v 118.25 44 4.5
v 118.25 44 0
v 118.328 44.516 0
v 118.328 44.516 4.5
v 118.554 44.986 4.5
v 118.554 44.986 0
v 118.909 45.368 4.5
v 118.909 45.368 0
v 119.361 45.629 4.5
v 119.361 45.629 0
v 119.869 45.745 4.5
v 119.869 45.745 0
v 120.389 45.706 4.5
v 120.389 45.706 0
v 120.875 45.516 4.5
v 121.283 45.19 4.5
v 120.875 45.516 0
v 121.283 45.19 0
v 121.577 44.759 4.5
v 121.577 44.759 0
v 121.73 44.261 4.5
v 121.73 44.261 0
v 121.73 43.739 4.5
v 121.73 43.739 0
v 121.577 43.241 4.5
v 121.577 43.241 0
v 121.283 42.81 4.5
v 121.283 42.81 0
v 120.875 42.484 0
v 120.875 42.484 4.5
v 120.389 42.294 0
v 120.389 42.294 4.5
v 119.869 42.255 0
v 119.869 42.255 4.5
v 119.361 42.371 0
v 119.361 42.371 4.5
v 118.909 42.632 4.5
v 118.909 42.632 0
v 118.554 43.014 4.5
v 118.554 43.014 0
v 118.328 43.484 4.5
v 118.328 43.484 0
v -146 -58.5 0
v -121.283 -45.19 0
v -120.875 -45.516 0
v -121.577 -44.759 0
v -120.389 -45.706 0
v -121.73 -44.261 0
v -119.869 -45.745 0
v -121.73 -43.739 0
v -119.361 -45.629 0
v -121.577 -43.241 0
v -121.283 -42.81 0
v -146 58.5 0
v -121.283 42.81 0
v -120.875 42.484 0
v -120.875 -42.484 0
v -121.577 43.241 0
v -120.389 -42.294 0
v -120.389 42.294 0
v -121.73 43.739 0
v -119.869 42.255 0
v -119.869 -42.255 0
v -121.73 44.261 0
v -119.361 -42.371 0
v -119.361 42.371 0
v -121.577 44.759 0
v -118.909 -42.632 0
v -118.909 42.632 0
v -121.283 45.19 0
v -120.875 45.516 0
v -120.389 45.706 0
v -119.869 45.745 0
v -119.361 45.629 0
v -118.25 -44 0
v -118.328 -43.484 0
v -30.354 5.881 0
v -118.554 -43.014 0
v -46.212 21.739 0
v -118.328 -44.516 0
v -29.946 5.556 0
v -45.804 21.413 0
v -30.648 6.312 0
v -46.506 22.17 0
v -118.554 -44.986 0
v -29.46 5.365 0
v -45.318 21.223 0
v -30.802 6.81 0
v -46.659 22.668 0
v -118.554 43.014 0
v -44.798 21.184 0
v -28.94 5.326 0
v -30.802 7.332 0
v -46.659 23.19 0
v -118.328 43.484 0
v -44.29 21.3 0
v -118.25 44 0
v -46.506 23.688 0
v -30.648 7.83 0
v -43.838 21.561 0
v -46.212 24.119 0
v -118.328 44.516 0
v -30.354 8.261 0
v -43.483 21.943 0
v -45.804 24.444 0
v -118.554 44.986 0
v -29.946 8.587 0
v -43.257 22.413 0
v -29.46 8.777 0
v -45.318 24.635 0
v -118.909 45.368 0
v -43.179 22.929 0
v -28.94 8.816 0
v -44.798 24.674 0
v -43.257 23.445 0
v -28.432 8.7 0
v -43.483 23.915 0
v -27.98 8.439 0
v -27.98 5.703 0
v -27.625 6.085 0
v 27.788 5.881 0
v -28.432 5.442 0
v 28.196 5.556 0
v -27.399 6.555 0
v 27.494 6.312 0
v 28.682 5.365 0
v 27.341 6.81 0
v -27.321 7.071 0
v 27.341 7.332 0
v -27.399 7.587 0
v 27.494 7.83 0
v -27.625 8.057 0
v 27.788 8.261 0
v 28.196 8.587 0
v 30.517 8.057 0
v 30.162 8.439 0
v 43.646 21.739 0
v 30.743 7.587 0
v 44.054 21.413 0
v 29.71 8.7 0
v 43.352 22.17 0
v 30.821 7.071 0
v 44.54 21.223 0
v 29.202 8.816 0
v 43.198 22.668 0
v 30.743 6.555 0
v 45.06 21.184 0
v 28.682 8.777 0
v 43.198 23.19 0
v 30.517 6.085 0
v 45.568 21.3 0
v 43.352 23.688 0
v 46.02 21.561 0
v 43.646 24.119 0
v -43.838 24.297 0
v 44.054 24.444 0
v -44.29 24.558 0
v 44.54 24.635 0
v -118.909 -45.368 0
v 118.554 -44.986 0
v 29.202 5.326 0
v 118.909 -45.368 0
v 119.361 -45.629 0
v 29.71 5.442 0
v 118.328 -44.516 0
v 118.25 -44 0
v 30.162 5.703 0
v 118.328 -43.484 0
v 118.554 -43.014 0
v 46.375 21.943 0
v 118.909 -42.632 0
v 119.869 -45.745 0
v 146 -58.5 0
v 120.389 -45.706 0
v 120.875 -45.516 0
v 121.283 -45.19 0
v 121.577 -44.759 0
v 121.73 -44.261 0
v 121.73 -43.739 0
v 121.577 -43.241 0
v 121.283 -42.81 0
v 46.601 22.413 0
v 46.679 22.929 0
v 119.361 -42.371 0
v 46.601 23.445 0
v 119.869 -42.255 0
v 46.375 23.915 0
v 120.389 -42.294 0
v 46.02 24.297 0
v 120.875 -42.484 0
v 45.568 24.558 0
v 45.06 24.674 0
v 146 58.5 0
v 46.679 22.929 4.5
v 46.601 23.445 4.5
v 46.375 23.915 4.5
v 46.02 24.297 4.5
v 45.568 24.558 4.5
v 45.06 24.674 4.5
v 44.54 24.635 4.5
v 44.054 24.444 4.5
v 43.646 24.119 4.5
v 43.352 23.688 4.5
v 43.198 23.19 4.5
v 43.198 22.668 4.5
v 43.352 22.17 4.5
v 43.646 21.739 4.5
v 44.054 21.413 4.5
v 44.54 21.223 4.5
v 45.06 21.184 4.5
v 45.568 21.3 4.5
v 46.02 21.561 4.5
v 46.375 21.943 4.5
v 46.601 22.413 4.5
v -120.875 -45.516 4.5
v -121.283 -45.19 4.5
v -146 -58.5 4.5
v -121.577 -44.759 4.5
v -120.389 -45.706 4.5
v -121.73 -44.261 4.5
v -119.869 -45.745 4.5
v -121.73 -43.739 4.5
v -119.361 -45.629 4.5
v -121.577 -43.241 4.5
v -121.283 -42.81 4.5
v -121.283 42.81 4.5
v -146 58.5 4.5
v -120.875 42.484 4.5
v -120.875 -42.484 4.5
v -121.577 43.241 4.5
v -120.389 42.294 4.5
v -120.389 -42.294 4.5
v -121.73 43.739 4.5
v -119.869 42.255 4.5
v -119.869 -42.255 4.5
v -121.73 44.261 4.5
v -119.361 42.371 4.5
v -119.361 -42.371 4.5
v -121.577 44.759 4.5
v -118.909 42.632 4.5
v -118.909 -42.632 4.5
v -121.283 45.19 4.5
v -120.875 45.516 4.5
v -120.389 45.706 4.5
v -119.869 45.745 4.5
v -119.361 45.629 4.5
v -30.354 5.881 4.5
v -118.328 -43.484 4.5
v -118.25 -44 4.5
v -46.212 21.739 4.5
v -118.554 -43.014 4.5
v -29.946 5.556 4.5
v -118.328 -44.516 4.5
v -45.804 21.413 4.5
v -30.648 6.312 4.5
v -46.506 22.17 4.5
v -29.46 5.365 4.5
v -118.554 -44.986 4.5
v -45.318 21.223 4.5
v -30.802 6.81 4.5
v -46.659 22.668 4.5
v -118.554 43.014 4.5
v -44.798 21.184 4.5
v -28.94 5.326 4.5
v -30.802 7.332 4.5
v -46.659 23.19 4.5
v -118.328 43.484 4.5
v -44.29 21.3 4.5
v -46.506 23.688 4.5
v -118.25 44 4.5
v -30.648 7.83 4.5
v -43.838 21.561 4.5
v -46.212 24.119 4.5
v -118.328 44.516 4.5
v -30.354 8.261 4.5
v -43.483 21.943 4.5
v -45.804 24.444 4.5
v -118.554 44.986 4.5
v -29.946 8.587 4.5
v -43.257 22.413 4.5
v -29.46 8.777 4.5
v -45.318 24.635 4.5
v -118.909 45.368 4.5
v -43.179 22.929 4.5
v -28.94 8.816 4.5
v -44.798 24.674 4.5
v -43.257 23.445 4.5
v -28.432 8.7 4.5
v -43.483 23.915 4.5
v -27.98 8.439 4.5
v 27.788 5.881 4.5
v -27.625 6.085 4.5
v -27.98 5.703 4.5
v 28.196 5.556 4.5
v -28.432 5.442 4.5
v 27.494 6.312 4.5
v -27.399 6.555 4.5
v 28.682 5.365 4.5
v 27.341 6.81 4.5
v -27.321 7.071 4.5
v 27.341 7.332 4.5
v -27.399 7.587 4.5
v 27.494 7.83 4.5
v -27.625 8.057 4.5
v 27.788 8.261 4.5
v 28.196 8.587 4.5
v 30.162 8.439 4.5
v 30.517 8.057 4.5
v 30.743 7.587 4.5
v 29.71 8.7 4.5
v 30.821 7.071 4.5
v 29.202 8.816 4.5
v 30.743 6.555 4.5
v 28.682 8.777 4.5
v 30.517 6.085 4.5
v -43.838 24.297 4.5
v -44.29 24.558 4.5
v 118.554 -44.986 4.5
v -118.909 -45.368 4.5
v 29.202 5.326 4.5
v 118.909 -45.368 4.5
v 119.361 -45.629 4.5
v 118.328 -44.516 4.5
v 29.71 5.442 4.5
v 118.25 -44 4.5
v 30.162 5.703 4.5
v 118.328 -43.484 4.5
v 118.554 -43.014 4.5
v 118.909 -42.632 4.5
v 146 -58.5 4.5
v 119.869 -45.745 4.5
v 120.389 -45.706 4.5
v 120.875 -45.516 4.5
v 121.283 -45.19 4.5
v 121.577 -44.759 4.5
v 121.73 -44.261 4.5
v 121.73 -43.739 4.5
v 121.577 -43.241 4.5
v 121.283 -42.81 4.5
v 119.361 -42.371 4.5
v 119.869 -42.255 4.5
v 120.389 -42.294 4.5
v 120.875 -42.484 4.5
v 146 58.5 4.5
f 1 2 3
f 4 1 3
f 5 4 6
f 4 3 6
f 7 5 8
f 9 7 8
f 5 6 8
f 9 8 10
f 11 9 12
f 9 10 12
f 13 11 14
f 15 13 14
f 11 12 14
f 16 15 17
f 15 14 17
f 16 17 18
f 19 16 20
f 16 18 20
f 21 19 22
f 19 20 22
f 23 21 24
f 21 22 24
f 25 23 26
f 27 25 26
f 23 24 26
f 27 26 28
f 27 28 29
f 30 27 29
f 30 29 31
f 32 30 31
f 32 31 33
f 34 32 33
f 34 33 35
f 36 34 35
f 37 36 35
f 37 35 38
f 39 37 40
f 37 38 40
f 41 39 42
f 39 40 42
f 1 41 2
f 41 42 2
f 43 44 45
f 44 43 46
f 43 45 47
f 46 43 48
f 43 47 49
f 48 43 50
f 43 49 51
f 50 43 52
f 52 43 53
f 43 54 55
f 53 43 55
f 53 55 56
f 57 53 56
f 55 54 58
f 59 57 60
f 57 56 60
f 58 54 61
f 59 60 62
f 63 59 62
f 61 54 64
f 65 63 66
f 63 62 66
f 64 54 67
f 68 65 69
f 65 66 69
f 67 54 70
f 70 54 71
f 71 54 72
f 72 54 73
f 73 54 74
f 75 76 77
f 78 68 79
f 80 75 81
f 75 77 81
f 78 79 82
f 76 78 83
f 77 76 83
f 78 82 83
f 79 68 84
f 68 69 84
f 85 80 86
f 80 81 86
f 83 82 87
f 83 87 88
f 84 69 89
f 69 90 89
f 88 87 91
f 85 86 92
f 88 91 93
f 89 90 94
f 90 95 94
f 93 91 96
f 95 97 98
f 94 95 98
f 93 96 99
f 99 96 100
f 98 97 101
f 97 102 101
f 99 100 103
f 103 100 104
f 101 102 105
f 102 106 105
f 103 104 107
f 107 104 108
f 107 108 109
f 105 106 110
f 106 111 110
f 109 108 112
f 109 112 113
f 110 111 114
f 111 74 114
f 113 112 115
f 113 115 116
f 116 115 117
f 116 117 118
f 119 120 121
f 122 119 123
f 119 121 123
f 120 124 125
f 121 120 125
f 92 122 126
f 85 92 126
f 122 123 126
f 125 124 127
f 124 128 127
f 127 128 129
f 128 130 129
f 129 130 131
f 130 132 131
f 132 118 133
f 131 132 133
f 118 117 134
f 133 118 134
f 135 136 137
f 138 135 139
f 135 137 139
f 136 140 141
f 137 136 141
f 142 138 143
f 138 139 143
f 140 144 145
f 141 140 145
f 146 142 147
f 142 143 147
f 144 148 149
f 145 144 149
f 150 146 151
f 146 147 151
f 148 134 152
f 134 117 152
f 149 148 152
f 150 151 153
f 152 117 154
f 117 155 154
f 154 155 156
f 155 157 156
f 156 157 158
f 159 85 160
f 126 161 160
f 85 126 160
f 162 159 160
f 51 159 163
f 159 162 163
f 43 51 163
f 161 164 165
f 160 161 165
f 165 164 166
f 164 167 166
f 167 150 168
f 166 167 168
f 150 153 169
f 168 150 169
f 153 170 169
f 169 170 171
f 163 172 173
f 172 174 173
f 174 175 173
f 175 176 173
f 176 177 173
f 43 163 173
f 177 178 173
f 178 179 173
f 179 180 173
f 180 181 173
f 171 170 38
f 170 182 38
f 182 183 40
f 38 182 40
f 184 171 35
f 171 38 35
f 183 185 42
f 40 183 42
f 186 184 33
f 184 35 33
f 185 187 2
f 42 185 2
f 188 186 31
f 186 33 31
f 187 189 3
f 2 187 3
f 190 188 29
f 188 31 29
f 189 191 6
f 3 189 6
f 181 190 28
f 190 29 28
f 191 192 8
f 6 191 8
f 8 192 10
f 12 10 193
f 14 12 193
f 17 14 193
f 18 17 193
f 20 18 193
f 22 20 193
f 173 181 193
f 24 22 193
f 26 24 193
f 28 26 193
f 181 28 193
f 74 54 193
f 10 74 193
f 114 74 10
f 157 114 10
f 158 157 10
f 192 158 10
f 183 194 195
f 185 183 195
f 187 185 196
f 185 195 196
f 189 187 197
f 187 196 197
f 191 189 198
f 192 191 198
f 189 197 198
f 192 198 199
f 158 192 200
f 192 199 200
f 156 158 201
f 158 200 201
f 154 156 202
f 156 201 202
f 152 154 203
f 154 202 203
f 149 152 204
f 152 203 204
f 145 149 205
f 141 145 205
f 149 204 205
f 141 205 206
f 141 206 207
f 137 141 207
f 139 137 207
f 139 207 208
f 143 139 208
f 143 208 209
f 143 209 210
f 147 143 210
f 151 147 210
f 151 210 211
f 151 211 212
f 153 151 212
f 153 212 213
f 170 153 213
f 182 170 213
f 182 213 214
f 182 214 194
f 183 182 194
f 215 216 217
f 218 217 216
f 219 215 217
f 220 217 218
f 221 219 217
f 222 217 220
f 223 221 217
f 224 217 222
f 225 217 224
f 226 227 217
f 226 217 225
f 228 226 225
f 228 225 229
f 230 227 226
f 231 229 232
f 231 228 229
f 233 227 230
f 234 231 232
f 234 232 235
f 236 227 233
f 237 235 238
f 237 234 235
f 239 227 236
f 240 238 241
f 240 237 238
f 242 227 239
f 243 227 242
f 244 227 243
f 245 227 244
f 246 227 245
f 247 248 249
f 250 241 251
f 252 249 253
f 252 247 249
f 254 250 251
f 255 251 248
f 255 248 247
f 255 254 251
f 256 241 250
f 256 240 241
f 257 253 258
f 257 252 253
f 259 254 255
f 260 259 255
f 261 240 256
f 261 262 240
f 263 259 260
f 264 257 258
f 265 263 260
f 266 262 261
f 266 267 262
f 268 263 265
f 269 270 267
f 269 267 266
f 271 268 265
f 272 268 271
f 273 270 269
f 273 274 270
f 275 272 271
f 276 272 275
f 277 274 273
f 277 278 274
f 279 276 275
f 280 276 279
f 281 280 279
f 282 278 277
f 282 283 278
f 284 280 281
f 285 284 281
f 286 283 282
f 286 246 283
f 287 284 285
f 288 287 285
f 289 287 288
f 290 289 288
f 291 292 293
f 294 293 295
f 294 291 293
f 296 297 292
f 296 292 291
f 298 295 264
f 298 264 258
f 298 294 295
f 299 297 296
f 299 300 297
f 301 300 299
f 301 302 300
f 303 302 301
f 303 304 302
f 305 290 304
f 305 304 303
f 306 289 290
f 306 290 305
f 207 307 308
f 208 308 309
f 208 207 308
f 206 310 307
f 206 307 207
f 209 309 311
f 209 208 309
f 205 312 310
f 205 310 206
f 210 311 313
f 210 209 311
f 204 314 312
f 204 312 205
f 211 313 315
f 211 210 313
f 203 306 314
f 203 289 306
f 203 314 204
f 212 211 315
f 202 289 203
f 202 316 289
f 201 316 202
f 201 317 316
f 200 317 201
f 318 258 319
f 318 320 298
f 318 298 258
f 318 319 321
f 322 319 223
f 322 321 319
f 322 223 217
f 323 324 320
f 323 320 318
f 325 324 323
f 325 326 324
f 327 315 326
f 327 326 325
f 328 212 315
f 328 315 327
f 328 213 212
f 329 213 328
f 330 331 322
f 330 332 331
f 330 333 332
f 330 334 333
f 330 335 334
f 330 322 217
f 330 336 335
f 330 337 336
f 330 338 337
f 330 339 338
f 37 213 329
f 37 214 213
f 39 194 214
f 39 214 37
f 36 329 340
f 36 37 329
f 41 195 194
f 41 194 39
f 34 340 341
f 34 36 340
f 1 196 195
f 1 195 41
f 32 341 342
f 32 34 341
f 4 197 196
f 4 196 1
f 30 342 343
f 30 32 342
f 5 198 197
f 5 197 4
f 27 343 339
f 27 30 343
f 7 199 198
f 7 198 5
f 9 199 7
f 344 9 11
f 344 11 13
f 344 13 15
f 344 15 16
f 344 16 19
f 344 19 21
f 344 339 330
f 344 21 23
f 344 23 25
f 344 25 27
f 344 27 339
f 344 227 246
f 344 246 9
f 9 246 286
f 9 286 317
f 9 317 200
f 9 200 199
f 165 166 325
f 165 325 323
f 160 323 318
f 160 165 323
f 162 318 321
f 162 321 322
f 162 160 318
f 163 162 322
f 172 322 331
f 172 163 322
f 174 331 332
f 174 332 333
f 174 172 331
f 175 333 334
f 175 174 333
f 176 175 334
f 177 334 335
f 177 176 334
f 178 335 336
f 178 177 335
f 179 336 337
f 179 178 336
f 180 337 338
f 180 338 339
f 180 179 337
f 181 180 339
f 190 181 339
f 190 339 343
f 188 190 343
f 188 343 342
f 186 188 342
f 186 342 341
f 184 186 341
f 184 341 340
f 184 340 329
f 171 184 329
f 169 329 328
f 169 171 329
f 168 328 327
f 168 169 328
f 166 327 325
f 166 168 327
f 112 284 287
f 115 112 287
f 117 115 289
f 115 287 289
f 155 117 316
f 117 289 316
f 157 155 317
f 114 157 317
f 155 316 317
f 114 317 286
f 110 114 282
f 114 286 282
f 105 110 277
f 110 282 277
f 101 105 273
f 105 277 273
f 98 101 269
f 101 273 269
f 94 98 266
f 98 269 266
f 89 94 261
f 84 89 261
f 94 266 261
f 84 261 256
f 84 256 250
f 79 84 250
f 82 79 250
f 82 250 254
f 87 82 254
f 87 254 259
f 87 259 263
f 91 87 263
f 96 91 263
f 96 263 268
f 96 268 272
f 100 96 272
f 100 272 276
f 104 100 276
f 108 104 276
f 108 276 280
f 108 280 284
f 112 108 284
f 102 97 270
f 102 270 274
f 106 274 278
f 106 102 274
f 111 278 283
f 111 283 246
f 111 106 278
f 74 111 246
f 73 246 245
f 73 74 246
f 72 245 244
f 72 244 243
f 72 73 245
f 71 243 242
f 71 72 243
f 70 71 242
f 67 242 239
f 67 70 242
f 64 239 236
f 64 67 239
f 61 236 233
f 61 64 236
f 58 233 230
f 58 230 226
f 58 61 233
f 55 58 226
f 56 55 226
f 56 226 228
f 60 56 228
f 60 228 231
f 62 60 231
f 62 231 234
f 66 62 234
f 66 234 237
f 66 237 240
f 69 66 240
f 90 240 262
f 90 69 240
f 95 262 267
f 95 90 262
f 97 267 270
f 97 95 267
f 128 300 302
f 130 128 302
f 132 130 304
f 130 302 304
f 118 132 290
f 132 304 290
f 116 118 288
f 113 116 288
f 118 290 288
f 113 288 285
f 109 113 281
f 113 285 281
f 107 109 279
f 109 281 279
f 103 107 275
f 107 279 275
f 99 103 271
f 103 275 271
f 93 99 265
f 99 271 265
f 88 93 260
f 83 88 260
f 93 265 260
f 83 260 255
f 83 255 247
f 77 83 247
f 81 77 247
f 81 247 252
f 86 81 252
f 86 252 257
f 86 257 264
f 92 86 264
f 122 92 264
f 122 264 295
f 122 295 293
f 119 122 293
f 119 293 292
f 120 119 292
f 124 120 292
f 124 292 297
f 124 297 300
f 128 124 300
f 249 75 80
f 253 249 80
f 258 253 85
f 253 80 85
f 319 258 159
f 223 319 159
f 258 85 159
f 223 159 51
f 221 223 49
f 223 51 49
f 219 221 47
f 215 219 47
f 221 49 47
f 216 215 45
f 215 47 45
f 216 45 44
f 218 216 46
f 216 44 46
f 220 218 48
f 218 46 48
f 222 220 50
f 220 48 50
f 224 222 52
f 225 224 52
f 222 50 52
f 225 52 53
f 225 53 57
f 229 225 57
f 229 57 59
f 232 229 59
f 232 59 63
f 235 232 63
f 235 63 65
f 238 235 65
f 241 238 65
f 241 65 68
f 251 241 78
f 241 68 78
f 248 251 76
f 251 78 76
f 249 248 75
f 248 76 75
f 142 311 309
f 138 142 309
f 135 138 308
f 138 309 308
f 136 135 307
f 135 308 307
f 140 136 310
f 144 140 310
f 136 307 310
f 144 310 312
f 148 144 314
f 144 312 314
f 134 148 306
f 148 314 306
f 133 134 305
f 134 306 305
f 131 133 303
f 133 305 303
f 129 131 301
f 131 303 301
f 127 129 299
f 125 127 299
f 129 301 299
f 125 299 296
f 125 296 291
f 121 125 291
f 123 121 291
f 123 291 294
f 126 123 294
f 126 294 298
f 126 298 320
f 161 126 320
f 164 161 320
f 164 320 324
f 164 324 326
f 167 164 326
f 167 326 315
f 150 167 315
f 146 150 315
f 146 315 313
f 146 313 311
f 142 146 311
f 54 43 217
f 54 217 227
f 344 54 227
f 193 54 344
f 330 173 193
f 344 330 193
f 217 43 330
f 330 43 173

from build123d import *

# Parameters (mm, degrees)
SKETCH1_W               = 292
SKETCH1_H               = 117
BOSS_EXTRUDE1_DEPTH     = 4.5
CUT_EXTRUDE1_REACH      = 159.348
SKETCH1_3_R             = 1.75
MIRROR3_COPY_1_REACH    = 159.348
MIRROR3_COPY_1_SKETCH_R = 1.75
MIRROR3_COPY_2_REACH    = 159.348
MIRROR3_COPY_2_SKETCH_R = 1.75
CUT_EXTRUDE2_REACH      = 159.348
SKETCH2_R               = 1.75


with BuildPart() as part:
    # Sketch1 → Boss-Extrude1 (new body)
    with BuildSketch(Plane.XY):
        Rectangle(SKETCH1_W, SKETCH1_H)
    extrude(amount=BOSS_EXTRUDE1_DEPTH)

    # Sketch1<3> → Cut-Extrude1 (cut, up to next)
    with BuildSketch(Plane.XY, mode=Mode.PRIVATE) as cut_extrude1_sk1:
        with Locations((-120, 44)):
            Circle(SKETCH1_3_R)
    cut_extrude1_tool1 = extrude(cut_extrude1_sk1.sketch, amount=CUT_EXTRUDE1_REACH, mode=Mode.PRIVATE) & part.part
    cut_extrude1 = cut_extrude1_tool1.solids().sort_by_distance((-120, 44, 0))[0]
    add(cut_extrude1, mode=Mode.SUBTRACT)

    # Mirror2: Cut-Extrude1 across plane
    add(cut_extrude1.mirror(Plane.ZX), mode=Mode.SUBTRACT)

    # Mirror3 copy 1 sketch → Mirror3 copy 1 (cut, up to next)
    with BuildSketch(Plane(origin=(0, 0, 0), x_dir=(-1, 0, 0), z_dir=(0, 0, 1)), mode=Mode.PRIVATE) as mirror3_copy_1_sk1:
        with Locations((-120, 44)):
            Circle(MIRROR3_COPY_1_SKETCH_R)
    mirror3_copy_1_tool1 = extrude(mirror3_copy_1_sk1.sketch, amount=MIRROR3_COPY_1_REACH, mode=Mode.PRIVATE) & part.part
    add(mirror3_copy_1_tool1.solids().sort_by_distance((120, -44, 0))[0], mode=Mode.SUBTRACT)

    # Mirror3 copy 2 sketch → Mirror3 copy 2 (cut, up to next)
    with BuildSketch(Plane(origin=(0, 0, 0), x_dir=(-1, 0, 0), z_dir=(0, 0, 1)), mode=Mode.PRIVATE) as mirror3_copy_2_sk1:
        with Locations((-120, -44)):
            Circle(MIRROR3_COPY_2_SKETCH_R)
    mirror3_copy_2_tool1 = extrude(mirror3_copy_2_sk1.sketch, amount=MIRROR3_COPY_2_REACH, mode=Mode.PRIVATE) & part.part
    add(mirror3_copy_2_tool1.solids().sort_by_distance((120, 44, 0))[0], mode=Mode.SUBTRACT)

    # Sketch2 → Cut-Extrude2 (cut, up to next)
    with BuildSketch(Plane.XY.offset(4.5), mode=Mode.PRIVATE) as cut_extrude2_sk1:
        with Locations((-29.071067812, 7.071067812)):
            Circle(SKETCH2_R)
    cut_extrude2_tool1 = extrude(cut_extrude2_sk1.sketch, amount=-CUT_EXTRUDE2_REACH, mode=Mode.PRIVATE) & part.part
    # Sketch2 → Cut-Extrude2 (cut, up to next)
    with BuildSketch(Plane.XY.offset(4.5), mode=Mode.PRIVATE) as cut_extrude2_sk2:
        with Locations((-44.928932188, 22.928932188)):
            Circle(SKETCH2_R)
    cut_extrude2_tool2 = extrude(cut_extrude2_sk2.sketch, amount=-CUT_EXTRUDE2_REACH, mode=Mode.PRIVATE) & part.part
    # Sketch2 → Cut-Extrude2 (cut, up to next)
    with BuildSketch(Plane.XY.offset(4.5), mode=Mode.PRIVATE) as cut_extrude2_sk3:
        with Locations((44.928932188, 22.928932188)):
            Circle(SKETCH2_R)
    cut_extrude2_tool3 = extrude(cut_extrude2_sk3.sketch, amount=-CUT_EXTRUDE2_REACH, mode=Mode.PRIVATE) & part.part
    # Sketch2 → Cut-Extrude2 (cut, up to next)
    with BuildSketch(Plane.XY.offset(4.5), mode=Mode.PRIVATE) as cut_extrude2_sk4:
        with Locations((29.071067812, 7.071067812)):
            Circle(SKETCH2_R)
    cut_extrude2_tool4 = extrude(cut_extrude2_sk4.sketch, amount=-CUT_EXTRUDE2_REACH, mode=Mode.PRIVATE) & part.part
    add(cut_extrude2_tool1.solids().sort_by_distance((-29.071068, 7.071068, 4.5))[0], mode=Mode.SUBTRACT)
    add(cut_extrude2_tool2.solids().sort_by_distance((-44.928932, 22.928932, 4.5))[0], mode=Mode.SUBTRACT)
    add(cut_extrude2_tool3.solids().sort_by_distance((44.928932, 22.928932, 4.5))[0], mode=Mode.SUBTRACT)
    add(cut_extrude2_tool4.solids().sort_by_distance((29.071068, 7.071068, 4.5))[0], mode=Mode.SUBTRACT)


solid = part.part
